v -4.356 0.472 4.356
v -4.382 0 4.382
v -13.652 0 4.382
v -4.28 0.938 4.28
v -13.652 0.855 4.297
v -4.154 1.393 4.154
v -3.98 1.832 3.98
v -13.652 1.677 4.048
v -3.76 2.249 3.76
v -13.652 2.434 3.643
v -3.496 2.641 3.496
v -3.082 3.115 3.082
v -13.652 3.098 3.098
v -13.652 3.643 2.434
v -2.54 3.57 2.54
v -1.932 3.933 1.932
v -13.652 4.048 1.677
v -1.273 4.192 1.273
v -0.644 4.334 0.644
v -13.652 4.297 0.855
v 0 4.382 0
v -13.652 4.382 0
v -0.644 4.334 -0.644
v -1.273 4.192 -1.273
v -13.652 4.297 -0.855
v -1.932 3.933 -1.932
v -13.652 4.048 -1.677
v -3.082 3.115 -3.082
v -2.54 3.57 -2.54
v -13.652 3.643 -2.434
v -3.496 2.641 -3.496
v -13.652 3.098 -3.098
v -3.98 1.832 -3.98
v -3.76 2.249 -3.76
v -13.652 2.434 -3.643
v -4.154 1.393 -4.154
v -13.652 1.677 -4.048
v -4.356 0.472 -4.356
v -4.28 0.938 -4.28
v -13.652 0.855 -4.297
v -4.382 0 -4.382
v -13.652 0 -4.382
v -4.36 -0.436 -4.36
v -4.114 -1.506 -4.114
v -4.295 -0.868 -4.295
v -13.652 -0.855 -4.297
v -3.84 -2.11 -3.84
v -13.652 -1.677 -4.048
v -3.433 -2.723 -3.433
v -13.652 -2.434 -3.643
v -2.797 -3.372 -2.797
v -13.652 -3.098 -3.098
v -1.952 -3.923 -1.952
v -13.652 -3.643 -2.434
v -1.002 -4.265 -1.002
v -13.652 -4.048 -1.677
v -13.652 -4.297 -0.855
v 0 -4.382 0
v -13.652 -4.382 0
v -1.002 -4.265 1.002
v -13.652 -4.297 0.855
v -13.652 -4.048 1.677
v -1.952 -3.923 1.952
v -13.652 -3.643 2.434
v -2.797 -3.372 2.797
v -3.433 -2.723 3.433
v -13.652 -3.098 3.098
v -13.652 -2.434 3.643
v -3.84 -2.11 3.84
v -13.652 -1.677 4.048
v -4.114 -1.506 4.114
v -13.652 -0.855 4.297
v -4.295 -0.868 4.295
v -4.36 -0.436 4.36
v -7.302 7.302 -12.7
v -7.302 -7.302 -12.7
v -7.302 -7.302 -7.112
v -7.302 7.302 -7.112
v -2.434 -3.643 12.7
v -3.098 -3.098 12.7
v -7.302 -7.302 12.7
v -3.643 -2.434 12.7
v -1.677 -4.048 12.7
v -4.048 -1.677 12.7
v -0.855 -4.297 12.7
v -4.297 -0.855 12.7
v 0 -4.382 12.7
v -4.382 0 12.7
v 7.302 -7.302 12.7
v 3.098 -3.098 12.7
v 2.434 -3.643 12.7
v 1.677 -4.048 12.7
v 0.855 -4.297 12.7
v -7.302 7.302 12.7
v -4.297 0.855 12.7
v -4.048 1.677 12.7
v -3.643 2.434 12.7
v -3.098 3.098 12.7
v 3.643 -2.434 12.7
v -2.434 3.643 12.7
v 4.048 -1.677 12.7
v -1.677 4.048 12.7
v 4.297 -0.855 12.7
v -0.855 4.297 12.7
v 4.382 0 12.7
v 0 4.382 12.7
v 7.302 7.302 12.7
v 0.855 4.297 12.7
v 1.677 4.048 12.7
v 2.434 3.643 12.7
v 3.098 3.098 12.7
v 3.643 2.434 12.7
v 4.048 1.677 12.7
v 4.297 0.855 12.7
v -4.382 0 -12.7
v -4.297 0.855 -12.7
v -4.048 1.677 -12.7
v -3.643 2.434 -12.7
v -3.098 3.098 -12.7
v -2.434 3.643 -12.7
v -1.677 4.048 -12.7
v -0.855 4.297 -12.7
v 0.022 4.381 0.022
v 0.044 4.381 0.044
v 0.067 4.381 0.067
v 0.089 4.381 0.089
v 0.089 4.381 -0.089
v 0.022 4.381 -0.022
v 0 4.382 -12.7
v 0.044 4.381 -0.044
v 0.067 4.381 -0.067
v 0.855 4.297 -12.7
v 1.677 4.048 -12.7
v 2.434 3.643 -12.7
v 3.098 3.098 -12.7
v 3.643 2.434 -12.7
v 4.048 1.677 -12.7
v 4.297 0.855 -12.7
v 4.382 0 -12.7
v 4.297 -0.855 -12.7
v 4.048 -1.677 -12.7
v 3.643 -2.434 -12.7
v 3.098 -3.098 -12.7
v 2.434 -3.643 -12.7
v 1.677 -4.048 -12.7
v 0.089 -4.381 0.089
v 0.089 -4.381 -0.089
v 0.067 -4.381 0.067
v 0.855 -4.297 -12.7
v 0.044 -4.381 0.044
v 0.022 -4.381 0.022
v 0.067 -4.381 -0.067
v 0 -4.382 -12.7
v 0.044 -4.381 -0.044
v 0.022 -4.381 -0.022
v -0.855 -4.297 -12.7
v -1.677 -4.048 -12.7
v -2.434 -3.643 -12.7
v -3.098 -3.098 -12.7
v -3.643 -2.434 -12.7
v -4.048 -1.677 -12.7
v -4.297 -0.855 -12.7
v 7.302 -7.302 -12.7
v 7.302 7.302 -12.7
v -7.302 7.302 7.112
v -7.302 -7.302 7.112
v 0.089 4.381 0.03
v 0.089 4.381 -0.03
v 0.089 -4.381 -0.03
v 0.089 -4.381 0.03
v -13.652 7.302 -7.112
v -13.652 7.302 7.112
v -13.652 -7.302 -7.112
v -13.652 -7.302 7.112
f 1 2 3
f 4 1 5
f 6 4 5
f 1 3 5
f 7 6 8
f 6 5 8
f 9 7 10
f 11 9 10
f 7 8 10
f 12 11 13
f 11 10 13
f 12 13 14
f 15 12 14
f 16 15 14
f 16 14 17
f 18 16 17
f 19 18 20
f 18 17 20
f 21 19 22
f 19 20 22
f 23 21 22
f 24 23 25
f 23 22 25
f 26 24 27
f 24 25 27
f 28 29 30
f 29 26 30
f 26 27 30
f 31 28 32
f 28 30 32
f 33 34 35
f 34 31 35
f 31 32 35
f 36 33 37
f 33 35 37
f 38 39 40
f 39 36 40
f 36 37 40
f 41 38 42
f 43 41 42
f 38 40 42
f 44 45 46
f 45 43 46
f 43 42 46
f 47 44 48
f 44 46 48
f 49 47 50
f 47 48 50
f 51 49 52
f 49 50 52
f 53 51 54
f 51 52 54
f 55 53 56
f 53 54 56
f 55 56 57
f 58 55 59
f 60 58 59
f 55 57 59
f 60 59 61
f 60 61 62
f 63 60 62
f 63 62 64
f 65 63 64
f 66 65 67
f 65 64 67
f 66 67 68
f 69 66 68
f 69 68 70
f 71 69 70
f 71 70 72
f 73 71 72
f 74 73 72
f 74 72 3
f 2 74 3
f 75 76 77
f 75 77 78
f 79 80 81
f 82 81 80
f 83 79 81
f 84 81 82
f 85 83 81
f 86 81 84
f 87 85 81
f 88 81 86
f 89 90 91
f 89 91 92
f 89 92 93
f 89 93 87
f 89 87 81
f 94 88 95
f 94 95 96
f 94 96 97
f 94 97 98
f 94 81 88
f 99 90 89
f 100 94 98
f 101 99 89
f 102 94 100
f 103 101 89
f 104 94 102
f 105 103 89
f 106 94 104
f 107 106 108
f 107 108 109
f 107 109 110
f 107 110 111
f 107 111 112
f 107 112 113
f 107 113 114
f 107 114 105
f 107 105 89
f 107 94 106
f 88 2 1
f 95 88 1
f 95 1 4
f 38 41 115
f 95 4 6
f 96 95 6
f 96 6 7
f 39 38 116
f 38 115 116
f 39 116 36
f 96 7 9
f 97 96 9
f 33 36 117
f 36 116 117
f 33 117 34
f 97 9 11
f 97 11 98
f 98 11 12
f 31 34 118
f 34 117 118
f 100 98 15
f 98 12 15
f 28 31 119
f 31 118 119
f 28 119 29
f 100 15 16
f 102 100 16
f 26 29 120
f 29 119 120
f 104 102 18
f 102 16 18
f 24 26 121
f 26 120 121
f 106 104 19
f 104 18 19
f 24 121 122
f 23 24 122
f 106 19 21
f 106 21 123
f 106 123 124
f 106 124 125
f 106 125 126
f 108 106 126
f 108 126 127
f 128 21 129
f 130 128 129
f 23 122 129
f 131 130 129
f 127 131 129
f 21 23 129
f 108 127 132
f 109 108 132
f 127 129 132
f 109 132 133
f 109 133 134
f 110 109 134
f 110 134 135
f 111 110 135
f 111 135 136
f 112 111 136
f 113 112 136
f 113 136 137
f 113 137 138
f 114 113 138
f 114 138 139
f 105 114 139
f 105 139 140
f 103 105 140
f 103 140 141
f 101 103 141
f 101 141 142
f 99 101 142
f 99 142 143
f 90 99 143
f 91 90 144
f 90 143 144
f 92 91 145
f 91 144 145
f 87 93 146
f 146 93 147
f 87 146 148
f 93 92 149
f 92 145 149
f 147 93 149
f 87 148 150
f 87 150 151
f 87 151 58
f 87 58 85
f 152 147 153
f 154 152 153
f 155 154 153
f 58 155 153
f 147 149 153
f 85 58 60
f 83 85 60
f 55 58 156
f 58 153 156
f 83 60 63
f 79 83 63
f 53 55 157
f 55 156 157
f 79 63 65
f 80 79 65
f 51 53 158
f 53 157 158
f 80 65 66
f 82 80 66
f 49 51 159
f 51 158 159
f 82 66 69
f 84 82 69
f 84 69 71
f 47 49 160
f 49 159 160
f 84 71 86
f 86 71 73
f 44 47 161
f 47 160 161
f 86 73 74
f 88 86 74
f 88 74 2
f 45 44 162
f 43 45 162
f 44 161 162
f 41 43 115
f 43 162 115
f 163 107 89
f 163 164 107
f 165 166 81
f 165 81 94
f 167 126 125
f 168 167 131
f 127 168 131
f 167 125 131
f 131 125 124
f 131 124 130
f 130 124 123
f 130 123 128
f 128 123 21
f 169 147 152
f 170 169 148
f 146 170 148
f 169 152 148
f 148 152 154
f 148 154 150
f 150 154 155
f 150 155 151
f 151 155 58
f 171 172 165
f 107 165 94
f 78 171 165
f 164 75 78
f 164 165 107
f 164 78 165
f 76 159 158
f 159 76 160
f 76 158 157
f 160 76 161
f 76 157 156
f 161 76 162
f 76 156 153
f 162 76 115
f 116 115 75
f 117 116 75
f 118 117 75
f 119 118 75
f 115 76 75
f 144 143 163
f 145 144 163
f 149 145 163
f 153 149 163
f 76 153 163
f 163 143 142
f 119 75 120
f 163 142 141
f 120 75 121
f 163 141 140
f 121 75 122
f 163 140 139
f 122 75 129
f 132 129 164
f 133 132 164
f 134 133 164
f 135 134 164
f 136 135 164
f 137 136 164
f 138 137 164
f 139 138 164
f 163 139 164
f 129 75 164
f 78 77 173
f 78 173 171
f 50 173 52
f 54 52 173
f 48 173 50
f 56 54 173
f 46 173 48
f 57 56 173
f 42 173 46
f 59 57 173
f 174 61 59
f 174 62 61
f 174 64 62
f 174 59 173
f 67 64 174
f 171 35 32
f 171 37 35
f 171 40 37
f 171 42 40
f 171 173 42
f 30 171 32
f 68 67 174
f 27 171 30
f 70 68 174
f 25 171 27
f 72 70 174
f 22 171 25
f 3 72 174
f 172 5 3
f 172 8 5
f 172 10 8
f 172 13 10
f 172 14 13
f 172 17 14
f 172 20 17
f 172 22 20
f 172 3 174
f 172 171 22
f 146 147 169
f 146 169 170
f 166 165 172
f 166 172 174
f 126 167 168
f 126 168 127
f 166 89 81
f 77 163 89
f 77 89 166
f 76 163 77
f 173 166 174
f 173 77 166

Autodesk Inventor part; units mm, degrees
ref_plane "YZ Plane" through (0, 0, 0) normal (1, 0, 0) x (0, 1, 0)
ref_plane "XZ Plane" through (0, 0, 0) normal (0, 1, 0) x (-1, 0, 0)
ref_plane "XY Plane" through (0, 0, 0) normal (0, 0, 1) x (1, 0, 0)
sketch "Sketch1" plane through (0, 0, 0) normal (0, 0, 1) x (1, 0, 0)
  line L0 (-7.3025, 7.3025) -> (7.3025, 7.3025)
  line L1 (7.3025, 7.3025) -> (7.3025, -7.3025)
  line L2 (7.3025, -7.3025) -> (-7.3025, -7.3025)
  line L3 (-7.3025, -7.3025) -> (-7.3025, 7.3025)
  point P0 (0, 0)
  point P1 (0, 7.3025)
  point P2 (-7.3025, 0)
  dimension "d0" = 14.605
  dimension "d1" = 14.605
extrude "Extrusion1" add sketch "Sketch1" along normal mid plane 25.4
sketch "Sketch2" plane through (-7.3025, -7.3025, 12.7) normal (-1, 0, 0) x (0, 0, 1)
  line L0 (0, 0) -> (0, 14.605) projected
  line L1 (-25.4, 14.605) -> (0, 14.605) projected
  line L2 (-25.4, 14.605) -> (-25.4, 0) projected
  line L3 (0, 0) -> (-25.4, 0) projected
  line L4 (-19.812, 14.605) -> (-5.588, 14.605)
  line L5 (-5.588, 14.605) -> (-5.588, 0)
  line L6 (-5.588, 0) -> (-19.812, 0)
  line L7 (-19.812, 0) -> (-19.812, 14.605)
  point P0 (-12.7, 0)
  dimension "d4" = 14.224
extrude "Extrusion2" add sketch "Sketch2" along normal blind 6.35 contours L3 L7 L1 L5
sketch "Sketch3" plane through (0, 0, -12.7) normal (0, 0, -1) x (-1, 0, 0)
  line L0 (7.3025, 7.3025) -> (7.3025, -7.3025) projected
  line L1 (-7.3025, 7.3025) -> (7.3025, 7.3025) projected
  line L2 (-7.3025, -7.3025) -> (-7.3025, 7.3025) projected
  line L3 (7.3025, -7.3025) -> (-7.3025, -7.3025) projected
  circle A0 centre (0, 0) radius 4.3815
  dimension "d7" = 8.763
extrude "Extrusion3" cut sketch "Sketch3" against normal through all contours A0
sketch "Sketch4" plane through (-13.6525, -7.3025, 12.7) normal (-1, 0, 0) x (0, 0, 1)
  circle A0 centre (-12.7, 7.3025) radius 4.3815
  line L0 (-19.812, 0) -> (-19.812, 14.605) projected
  line L1 (0, 0) -> (-25.4, 0) projected
  line L2 (-19.812, 14.605) -> (-5.588, 14.605) projected
  line L3 (-19.812, 0) -> (-19.812, 14.605) projected
  line L4 (-5.588, 0) -> (-19.812, 0) projected
  line L5 (-5.588, 14.605) -> (-5.588, 0) projected
  point P0 (-12.7, 14.605)
  point P1 (-19.812, 7.3025)
  dimension "d10" = 8.763
extrude "Extrusion4" cut sketch "Sketch4" against normal blind 13.7414 contours A0
thread "Thread1" size "3/8-16 UNC" class "1B" standard "ANSI Unified Screw Threads" length 8.89
thread "Thread2" size "3/8-16 UNC" class "1B" standard "ANSI Unified Screw Threads" length 8.89
thread "Thread3" size "3/8-16 UNC" class "1B" standard "ANSI Unified Screw Threads" length 8.89
equation "\"d0\" = d1"
properties part number "2203P-2"
